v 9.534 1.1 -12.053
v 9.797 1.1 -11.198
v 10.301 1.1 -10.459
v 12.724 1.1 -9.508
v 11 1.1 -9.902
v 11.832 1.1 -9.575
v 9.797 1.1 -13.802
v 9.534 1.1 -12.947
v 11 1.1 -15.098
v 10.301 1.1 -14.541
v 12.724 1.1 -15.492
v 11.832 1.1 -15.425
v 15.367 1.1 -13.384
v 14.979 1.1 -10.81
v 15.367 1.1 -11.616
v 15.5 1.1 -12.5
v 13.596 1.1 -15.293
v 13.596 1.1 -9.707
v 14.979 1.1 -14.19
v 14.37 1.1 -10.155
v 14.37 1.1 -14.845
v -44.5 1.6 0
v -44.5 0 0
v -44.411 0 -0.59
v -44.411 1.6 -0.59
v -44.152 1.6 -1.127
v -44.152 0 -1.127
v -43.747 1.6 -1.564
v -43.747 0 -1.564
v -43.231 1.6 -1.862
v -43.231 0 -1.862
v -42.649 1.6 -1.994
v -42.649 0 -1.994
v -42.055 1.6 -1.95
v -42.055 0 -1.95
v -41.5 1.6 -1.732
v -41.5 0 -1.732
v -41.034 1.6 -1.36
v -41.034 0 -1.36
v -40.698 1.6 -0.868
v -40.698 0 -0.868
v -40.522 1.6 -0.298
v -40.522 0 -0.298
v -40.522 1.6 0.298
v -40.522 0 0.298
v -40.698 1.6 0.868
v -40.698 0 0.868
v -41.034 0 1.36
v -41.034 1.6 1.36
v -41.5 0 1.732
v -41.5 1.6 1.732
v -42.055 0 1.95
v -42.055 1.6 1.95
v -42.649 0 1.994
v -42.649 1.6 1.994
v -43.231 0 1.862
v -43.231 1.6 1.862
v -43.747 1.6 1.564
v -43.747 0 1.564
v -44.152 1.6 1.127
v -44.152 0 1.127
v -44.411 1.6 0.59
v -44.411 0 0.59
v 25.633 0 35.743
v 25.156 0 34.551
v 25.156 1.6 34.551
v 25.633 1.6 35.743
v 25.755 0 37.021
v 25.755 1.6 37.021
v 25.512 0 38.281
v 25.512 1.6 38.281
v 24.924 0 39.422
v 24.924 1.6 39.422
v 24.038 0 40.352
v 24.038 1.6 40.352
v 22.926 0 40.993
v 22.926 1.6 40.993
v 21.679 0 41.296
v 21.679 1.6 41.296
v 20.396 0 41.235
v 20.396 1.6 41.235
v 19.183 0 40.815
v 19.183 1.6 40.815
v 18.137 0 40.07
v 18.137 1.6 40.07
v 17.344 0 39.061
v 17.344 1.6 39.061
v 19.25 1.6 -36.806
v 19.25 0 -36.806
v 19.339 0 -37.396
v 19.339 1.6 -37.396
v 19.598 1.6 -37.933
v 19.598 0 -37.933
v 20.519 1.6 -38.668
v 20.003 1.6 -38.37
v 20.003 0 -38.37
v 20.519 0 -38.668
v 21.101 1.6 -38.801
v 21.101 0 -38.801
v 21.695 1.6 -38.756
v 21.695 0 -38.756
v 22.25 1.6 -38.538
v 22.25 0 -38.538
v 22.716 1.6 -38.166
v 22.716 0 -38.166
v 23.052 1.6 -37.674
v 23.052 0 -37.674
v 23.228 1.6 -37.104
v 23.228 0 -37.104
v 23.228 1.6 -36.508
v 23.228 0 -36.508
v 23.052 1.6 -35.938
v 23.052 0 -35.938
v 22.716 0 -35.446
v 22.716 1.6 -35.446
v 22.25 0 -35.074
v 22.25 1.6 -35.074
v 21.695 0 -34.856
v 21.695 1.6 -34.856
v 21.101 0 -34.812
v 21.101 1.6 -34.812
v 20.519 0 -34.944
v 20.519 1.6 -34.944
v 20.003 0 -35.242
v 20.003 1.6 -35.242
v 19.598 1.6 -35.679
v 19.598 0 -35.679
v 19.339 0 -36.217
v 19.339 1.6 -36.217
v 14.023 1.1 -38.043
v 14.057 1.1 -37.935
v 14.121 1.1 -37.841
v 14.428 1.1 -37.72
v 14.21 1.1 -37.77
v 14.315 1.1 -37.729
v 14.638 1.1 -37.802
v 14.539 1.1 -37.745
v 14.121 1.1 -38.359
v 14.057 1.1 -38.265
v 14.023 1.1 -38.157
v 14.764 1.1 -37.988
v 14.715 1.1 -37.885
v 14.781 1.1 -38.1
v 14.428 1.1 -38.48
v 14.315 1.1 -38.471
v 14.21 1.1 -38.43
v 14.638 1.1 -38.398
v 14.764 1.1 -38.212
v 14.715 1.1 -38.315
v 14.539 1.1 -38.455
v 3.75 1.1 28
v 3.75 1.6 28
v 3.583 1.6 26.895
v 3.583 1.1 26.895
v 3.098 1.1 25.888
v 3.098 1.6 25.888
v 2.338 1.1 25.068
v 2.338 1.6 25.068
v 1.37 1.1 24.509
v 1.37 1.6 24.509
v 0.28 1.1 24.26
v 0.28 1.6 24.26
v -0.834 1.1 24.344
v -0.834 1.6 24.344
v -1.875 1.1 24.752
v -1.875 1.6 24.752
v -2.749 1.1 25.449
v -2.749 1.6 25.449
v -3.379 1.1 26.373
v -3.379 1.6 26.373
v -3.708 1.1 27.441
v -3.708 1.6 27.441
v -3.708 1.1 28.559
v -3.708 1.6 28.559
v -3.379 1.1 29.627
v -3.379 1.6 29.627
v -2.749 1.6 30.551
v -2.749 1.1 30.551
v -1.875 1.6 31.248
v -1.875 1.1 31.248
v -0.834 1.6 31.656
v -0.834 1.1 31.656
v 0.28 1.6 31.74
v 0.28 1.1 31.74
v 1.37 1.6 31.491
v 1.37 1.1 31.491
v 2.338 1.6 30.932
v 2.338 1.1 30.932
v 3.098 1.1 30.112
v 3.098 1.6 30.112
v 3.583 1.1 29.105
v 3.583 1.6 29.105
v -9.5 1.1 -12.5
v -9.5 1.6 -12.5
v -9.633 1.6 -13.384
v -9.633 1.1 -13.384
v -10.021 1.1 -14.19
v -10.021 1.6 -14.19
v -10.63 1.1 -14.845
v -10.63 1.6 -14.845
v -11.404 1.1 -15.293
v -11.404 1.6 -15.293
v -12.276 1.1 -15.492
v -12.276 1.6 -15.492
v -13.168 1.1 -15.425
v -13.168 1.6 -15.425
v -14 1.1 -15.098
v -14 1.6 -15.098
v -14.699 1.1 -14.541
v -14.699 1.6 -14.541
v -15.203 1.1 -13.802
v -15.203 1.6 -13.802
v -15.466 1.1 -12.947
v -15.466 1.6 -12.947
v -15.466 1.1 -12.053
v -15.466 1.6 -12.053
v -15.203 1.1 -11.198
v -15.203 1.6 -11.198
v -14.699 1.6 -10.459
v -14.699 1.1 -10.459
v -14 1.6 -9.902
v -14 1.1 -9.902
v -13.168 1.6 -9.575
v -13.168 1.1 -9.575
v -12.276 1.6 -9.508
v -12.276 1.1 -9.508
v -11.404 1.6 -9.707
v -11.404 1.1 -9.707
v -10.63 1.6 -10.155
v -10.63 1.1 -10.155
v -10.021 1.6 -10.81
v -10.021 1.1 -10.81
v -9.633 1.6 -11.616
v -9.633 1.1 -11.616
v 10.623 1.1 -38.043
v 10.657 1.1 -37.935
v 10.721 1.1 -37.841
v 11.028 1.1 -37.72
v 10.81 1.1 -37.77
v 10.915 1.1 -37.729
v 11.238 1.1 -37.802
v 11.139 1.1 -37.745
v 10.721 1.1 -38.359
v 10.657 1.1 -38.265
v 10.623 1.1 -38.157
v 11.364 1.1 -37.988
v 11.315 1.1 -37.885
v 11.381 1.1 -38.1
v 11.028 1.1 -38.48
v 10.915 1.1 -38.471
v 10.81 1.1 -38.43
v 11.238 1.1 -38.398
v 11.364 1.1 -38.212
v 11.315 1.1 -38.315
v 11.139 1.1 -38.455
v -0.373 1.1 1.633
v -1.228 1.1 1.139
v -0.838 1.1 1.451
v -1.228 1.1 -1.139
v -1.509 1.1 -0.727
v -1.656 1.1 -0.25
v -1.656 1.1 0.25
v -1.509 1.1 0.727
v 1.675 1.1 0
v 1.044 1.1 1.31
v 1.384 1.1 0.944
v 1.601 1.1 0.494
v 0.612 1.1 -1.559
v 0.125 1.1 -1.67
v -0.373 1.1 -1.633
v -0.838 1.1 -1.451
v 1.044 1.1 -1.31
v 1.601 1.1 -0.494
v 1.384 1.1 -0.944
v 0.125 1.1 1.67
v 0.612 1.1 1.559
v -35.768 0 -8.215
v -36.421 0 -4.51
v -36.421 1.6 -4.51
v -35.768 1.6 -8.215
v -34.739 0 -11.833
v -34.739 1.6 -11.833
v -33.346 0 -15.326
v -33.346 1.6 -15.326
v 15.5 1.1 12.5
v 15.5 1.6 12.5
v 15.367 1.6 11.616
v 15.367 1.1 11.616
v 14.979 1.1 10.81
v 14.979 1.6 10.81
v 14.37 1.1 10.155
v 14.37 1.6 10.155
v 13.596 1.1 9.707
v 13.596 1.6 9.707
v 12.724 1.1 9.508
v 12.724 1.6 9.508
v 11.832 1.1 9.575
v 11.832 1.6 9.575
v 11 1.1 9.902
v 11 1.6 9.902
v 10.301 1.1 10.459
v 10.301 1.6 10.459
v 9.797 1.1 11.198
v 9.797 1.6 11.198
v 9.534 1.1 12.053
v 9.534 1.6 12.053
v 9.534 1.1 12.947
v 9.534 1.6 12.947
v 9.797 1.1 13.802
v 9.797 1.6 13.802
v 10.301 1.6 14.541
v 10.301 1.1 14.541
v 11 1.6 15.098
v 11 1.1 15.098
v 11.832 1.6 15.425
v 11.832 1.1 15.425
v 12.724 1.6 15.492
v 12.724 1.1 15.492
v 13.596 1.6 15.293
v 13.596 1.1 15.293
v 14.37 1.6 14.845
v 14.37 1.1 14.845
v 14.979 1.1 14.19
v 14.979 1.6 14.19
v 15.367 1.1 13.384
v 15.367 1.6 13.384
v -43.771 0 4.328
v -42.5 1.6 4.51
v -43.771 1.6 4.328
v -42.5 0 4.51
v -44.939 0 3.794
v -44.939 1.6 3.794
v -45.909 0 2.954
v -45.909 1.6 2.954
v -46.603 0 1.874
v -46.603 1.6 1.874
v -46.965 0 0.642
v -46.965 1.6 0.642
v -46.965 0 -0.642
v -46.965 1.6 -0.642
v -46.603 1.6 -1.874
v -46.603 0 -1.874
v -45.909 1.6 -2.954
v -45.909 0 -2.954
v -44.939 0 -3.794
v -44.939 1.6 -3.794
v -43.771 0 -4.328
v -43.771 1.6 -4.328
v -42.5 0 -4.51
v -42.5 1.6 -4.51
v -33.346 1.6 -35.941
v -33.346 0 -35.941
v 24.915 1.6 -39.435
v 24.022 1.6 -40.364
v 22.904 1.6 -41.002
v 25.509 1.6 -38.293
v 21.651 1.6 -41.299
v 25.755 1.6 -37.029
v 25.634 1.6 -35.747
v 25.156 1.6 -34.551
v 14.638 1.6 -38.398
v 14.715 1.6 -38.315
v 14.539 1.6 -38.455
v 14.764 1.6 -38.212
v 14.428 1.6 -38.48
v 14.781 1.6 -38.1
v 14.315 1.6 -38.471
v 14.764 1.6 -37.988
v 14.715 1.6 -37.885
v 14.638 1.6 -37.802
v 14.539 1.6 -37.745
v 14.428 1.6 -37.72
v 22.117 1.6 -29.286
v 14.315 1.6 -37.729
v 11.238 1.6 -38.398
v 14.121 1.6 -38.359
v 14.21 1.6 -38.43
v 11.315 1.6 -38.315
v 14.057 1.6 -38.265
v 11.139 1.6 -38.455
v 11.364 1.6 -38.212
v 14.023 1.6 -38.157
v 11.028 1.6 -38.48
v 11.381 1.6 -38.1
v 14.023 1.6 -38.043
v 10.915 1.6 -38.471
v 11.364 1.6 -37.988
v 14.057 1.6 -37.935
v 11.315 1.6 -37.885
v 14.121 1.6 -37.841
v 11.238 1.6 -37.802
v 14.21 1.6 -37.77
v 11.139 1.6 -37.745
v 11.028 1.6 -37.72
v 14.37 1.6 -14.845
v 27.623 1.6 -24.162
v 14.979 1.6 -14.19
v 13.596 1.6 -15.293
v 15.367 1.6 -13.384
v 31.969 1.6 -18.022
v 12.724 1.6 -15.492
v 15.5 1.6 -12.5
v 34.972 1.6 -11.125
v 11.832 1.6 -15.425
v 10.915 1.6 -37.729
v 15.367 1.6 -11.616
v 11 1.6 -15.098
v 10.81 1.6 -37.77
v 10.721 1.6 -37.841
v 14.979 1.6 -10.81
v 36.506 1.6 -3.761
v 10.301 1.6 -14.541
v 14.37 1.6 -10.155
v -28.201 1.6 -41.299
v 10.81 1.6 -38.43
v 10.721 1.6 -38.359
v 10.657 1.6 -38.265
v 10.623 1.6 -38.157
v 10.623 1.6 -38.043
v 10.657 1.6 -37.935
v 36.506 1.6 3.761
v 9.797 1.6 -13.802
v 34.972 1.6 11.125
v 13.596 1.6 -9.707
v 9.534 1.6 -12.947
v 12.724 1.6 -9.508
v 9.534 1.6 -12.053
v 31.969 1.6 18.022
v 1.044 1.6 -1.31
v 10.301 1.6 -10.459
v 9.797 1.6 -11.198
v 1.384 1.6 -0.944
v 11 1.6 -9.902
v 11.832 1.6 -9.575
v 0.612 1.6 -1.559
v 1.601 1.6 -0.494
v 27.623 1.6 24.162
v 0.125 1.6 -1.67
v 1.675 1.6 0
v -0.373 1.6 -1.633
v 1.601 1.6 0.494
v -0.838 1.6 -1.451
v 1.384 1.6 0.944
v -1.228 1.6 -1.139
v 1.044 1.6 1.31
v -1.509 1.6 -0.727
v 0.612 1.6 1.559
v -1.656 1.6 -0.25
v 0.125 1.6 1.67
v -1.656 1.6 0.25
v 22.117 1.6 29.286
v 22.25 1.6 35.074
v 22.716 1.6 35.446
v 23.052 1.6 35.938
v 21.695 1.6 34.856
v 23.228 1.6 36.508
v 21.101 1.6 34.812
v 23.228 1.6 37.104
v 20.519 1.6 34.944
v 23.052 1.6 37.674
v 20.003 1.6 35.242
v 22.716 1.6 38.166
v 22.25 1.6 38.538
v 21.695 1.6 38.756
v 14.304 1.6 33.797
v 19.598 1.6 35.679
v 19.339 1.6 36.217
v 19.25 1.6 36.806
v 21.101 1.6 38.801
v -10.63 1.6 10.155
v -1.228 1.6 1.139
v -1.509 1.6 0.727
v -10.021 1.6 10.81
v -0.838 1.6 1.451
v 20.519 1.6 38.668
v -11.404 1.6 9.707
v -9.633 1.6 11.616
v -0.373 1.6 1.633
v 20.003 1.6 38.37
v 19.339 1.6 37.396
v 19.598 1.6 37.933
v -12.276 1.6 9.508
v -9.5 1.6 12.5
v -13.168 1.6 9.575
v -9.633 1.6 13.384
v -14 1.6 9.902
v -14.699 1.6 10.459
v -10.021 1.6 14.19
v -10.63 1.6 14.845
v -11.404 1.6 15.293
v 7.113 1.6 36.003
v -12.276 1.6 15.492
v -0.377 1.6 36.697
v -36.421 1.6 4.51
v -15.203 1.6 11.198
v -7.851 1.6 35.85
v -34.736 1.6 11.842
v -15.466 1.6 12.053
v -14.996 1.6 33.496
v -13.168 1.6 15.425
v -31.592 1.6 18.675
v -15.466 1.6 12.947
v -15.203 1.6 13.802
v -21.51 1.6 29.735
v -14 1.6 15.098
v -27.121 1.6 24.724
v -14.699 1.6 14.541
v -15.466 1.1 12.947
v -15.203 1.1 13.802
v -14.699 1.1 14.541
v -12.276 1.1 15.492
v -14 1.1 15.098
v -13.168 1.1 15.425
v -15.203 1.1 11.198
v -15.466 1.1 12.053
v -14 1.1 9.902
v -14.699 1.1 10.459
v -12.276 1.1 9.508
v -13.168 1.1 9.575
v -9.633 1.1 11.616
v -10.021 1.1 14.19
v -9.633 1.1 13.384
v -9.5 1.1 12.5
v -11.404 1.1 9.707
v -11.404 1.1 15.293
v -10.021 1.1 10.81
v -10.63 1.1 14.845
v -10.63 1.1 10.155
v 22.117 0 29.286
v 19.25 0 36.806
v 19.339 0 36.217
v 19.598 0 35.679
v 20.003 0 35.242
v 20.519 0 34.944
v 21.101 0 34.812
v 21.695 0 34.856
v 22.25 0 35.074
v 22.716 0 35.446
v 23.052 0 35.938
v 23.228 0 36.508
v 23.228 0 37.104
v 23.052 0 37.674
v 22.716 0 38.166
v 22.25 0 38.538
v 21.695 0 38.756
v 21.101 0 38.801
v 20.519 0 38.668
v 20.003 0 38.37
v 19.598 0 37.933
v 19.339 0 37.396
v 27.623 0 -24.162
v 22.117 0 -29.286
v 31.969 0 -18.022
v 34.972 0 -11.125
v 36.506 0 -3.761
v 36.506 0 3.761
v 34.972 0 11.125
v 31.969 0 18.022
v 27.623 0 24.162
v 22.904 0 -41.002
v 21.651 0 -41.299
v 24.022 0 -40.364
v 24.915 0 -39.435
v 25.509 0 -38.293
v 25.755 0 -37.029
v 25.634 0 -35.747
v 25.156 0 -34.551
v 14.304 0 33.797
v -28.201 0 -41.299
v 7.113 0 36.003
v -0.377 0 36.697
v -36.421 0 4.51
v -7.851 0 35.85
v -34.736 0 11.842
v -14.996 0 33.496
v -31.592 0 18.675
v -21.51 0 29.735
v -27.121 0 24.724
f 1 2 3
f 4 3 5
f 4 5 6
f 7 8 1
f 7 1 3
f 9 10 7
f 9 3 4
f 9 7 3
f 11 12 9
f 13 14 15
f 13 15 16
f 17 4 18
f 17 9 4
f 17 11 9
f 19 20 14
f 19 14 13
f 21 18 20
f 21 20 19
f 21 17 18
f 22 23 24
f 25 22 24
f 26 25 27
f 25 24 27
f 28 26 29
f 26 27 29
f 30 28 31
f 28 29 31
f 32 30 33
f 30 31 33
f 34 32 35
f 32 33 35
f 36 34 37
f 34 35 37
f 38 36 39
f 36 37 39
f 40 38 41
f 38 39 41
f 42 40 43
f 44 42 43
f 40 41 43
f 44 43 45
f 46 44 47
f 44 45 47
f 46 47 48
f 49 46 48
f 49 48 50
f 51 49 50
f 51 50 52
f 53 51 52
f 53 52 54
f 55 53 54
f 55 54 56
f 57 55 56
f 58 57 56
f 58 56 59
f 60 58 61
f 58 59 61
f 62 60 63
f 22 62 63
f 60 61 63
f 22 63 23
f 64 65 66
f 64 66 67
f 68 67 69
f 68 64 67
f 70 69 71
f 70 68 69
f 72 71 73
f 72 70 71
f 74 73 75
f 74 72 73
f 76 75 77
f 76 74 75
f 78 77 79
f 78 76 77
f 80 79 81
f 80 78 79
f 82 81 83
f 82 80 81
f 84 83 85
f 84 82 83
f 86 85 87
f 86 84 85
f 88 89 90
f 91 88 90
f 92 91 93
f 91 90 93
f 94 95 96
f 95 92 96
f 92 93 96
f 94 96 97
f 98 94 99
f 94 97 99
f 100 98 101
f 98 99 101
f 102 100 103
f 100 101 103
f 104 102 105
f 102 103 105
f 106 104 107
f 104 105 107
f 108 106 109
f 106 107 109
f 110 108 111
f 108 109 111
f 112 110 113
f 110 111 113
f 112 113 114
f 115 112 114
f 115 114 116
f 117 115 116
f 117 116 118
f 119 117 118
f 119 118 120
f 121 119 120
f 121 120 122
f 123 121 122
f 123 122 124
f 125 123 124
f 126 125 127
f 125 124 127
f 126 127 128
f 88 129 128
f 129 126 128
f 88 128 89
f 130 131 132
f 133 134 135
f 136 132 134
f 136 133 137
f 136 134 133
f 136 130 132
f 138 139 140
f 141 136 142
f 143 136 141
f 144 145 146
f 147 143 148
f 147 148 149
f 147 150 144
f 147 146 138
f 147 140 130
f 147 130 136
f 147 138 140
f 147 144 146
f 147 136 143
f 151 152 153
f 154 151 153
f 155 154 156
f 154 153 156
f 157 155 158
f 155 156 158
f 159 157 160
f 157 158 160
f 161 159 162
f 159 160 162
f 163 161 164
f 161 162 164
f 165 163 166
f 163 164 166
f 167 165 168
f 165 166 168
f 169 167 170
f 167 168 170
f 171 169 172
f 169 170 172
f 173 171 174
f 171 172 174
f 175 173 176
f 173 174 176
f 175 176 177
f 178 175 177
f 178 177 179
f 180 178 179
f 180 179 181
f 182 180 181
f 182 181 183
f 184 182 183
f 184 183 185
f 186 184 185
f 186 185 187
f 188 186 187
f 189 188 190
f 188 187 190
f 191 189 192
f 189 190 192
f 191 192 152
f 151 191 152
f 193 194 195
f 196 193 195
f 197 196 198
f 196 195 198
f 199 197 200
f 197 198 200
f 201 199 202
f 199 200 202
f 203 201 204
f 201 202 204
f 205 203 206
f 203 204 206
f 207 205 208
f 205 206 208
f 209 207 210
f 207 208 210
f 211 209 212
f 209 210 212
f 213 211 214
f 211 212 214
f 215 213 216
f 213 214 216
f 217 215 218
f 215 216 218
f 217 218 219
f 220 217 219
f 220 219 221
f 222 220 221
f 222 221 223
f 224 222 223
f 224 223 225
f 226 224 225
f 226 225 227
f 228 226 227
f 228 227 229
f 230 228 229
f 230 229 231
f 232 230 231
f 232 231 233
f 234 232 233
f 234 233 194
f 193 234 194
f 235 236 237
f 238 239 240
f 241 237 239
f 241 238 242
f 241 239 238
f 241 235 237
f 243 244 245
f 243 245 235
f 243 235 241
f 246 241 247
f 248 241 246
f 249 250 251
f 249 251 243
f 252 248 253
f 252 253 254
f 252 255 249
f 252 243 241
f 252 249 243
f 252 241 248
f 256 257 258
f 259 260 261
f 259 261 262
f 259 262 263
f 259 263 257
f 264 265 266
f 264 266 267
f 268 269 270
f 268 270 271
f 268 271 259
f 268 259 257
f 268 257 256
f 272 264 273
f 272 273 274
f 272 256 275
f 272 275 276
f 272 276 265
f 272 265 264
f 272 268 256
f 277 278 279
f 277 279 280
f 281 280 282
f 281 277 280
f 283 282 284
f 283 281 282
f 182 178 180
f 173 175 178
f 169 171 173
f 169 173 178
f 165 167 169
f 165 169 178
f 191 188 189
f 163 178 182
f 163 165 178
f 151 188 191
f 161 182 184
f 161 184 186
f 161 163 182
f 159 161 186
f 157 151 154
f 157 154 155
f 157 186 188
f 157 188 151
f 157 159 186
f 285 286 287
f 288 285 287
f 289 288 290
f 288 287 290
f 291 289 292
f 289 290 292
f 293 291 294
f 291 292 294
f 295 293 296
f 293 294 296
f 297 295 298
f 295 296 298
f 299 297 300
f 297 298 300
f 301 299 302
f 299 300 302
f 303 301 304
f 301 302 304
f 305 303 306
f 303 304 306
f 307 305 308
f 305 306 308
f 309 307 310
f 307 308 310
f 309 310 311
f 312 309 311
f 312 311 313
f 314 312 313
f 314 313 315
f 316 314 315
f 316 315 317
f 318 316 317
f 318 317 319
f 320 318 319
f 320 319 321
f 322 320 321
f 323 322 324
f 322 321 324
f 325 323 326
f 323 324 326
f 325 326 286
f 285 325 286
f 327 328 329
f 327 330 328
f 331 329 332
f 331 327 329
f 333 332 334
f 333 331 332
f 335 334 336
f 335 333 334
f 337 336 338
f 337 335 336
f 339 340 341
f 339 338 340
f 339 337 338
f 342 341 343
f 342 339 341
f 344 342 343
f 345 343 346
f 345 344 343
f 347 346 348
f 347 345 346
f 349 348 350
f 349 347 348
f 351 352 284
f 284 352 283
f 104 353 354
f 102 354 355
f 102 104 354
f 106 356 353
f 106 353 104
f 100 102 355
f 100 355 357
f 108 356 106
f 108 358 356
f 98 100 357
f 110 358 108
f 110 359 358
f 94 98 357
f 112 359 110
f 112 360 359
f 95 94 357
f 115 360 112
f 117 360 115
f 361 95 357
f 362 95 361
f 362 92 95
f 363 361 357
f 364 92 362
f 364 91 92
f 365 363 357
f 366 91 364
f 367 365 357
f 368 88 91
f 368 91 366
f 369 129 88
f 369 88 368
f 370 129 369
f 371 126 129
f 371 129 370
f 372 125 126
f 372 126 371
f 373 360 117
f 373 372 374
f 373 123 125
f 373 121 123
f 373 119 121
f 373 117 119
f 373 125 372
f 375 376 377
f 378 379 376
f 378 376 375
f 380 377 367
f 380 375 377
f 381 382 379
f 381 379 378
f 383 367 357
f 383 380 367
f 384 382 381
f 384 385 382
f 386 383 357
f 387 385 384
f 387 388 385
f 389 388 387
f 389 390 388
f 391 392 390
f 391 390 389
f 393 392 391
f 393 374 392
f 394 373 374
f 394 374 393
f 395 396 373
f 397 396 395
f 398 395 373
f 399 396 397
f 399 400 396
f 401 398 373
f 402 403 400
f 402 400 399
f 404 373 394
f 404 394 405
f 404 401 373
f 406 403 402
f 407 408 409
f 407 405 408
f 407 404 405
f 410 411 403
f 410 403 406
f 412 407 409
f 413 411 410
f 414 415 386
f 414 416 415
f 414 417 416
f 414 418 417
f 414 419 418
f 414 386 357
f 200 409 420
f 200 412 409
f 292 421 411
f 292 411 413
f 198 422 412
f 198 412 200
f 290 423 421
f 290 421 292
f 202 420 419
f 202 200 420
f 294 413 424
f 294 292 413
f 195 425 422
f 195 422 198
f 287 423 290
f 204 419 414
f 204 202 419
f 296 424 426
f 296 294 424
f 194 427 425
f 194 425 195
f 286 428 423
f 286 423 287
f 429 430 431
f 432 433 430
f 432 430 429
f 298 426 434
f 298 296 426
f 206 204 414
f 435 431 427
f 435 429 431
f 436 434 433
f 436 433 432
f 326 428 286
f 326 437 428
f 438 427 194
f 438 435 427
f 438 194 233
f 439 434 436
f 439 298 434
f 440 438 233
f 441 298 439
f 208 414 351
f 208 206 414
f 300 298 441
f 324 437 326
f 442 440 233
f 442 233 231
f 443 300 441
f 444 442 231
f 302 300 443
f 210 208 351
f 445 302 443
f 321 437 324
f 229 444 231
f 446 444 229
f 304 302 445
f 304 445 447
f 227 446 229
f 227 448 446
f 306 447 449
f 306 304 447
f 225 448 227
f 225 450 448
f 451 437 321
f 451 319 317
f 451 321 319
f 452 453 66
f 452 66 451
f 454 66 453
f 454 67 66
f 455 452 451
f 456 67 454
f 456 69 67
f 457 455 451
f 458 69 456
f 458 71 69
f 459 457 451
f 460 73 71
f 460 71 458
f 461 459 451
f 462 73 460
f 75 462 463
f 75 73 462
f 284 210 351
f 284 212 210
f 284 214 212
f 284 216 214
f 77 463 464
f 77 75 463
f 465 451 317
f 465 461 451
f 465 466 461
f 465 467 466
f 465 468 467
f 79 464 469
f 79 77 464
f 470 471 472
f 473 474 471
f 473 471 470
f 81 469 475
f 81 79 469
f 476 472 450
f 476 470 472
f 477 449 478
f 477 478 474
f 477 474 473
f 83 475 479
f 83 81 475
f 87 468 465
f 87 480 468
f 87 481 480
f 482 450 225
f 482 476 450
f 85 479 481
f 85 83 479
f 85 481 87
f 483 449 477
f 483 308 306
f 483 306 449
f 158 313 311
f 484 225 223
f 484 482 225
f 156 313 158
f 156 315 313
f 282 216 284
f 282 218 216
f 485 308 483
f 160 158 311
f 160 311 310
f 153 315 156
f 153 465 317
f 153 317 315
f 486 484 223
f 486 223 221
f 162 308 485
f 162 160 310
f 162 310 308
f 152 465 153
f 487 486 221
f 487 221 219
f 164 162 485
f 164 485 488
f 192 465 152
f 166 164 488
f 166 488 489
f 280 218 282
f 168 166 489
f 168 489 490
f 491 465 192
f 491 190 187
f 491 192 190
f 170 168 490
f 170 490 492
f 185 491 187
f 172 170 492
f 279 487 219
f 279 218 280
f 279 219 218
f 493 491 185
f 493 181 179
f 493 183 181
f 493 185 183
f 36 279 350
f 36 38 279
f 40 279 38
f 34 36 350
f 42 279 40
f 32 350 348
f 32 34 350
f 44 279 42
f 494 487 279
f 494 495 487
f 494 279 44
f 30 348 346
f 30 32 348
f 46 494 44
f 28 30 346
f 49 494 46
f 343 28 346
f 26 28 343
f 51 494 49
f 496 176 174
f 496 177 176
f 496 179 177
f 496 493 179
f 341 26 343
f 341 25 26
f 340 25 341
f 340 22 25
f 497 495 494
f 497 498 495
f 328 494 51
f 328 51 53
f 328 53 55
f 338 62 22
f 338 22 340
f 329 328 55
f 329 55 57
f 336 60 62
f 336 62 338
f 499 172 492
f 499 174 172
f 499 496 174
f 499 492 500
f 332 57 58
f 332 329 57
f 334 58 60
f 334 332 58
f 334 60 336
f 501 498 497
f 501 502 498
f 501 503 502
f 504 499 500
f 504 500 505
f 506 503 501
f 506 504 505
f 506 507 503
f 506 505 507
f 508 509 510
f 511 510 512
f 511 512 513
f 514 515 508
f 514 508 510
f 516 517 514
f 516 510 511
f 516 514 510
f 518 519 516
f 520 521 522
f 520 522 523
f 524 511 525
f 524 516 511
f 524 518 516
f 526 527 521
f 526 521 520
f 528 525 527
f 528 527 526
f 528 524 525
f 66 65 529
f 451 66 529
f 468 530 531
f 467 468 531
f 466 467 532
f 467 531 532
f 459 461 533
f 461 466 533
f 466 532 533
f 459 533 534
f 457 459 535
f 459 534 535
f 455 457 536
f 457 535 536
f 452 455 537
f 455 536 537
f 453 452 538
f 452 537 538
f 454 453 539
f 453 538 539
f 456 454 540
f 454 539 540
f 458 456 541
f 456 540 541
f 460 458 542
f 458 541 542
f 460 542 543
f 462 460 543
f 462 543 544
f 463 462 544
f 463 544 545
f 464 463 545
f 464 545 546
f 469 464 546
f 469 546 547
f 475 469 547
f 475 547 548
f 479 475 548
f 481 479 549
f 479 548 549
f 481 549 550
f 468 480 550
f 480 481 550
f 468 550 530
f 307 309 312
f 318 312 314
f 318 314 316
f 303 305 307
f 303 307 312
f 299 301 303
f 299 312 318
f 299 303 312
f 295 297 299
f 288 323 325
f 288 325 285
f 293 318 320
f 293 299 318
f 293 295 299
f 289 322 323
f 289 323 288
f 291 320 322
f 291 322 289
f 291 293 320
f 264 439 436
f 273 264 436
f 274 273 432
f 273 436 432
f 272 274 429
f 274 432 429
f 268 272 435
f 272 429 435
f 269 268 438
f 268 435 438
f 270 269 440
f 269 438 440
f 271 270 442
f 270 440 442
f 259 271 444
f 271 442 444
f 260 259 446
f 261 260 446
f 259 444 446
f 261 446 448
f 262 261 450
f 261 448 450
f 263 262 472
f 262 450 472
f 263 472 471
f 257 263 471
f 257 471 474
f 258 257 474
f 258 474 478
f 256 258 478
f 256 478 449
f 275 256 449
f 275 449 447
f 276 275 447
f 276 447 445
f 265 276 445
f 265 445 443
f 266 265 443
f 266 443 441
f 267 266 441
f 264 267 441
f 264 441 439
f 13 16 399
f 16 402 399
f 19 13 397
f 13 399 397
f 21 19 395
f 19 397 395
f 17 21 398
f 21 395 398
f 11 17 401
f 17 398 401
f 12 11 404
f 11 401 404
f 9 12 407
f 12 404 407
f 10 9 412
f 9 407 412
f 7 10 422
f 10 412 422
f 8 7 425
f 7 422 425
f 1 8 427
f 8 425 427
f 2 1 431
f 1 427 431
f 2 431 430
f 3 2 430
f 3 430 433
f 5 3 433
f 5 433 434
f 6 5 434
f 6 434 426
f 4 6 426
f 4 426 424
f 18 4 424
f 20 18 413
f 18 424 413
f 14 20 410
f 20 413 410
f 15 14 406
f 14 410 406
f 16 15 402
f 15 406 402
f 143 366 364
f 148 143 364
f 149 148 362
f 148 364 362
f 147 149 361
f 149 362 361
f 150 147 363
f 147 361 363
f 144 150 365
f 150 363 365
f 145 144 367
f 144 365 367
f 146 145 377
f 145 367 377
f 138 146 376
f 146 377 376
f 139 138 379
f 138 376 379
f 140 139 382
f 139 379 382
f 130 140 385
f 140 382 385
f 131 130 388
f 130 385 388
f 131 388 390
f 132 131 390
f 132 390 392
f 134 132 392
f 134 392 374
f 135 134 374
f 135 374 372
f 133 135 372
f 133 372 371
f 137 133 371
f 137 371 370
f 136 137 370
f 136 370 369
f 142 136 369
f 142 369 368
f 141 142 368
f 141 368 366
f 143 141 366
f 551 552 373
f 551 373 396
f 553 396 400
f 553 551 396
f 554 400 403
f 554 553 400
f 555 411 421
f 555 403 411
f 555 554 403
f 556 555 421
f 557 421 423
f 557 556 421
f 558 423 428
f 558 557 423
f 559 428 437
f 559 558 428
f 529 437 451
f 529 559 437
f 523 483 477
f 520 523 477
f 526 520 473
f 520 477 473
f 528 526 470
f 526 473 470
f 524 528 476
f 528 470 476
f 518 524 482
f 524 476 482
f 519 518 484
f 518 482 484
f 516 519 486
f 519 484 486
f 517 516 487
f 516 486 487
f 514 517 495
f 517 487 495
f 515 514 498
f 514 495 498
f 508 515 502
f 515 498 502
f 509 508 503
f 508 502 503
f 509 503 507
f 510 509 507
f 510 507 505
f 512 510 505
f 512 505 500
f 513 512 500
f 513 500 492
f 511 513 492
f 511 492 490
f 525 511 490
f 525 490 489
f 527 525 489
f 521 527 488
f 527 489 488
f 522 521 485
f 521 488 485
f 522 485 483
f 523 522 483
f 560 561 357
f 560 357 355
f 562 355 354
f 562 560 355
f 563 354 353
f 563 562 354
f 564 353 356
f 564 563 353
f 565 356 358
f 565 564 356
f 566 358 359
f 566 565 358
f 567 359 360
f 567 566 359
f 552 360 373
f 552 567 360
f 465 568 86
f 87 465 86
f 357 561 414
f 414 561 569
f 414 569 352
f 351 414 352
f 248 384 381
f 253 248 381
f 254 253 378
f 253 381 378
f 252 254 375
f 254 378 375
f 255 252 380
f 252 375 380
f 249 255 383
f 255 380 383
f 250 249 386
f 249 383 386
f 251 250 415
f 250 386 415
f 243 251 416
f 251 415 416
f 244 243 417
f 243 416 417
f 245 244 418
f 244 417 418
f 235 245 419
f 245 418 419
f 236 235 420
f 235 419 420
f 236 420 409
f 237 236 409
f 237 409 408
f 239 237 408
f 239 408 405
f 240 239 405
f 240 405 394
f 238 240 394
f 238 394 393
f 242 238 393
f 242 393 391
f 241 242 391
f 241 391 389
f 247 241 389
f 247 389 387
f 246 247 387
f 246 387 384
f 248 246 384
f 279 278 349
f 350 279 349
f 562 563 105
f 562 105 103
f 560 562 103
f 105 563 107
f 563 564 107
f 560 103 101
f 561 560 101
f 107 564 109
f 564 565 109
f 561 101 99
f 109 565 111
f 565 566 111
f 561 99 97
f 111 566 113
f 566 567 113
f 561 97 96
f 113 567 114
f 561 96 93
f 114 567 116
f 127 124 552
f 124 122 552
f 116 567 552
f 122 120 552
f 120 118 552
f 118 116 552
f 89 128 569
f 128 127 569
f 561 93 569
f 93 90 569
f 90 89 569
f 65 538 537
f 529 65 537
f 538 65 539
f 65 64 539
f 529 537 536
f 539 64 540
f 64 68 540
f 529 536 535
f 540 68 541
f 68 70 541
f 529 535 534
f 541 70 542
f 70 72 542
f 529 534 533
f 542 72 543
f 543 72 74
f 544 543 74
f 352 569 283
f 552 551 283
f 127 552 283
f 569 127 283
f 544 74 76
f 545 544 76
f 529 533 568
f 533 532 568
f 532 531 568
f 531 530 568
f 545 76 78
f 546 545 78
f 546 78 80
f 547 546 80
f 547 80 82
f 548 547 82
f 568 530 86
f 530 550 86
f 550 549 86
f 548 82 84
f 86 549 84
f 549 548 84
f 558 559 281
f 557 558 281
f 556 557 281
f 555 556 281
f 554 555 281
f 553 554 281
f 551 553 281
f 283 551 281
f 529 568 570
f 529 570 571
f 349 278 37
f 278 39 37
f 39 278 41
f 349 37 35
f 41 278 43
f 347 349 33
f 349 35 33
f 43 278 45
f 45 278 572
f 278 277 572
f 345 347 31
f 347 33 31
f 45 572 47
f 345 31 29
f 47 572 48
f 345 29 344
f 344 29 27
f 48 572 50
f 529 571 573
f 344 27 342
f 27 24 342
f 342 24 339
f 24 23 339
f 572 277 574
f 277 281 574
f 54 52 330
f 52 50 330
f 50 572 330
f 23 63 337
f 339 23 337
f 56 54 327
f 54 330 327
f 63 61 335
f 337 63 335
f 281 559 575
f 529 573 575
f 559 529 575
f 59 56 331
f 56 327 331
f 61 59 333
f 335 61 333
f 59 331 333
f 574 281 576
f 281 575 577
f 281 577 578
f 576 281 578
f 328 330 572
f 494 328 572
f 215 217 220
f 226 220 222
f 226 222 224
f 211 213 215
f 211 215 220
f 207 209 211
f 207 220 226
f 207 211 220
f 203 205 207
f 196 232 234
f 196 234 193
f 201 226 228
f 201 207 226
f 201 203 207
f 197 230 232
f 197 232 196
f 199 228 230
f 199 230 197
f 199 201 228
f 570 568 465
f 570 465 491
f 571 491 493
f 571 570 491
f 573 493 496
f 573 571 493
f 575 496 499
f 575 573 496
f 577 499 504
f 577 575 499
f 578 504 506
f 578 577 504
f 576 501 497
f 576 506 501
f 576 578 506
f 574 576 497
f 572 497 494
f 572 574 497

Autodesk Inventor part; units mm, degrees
ref_plane "YZ Plane" through (0, 0, 0) normal (1, 0, 0) x (0, 1, 0)
ref_plane "XZ Plane" through (0, 0, 0) normal (0, 1, 0) x (-1, 0, 0)
ref_plane "XY Plane" through (0, 0, 0) normal (0, 0, 1) x (1, 0, 0)
sketch "Sketch1" plane through (0, 0, 0) normal (0, 1, 0) x (-1, 0, 0)
  circle A0 centre (42.5, 0) radius 2
  circle A1 centre (-21.25, 36.8061) radius 2
  circle A2 centre (-21.25, -36.8061) radius 2
  line L0 (-21.25, -36.8061) -> (0, 0) construction
  arc A3 (-25.1562, -34.5508) -> (-20.8492, -41.2987) centre (-21.25, -36.8061) ccw
  line L1 (-21.25, 36.8061) -> (0, 0) construction
  arc A4 (-17.3438, 39.0613) -> (-25.1562, 34.5508) centre (-21.25, 36.8061) ccw
  line L2 (0, 0) -> (42.5, 0) construction
  arc A5 (42.5, -4.5105) -> (42.5, 4.5105) centre (42.5, 0) ccw
  line L3 (-21.6508, -41.2987) -> (28.2014, -41.2987)
  line L4 (28.2014, -41.2987) -> (33.3458, -35.9407)
  line L5 (33.3458, -35.9407) -> (33.3458, -15.3261)
  line L6 (-25.1562, -34.5508) -> (-22.1167, -29.2863)
  line L7 (36.421, -4.5105) -> (42.5, -4.5105)
  line L8 (42.5, 0) -> (36.6992, 0)
  line L9 (4.5105, 0) -> (0, 0)
  line L10 (42.5, 4.5105) -> (36.421, 4.5105)
  line L11 (-25.1562, 34.5508) -> (-22.1167, 29.2863)
  line L12 (-14.3043, 33.7968) -> (-17.3438, 39.0613)
  arc A6 (-22.1167, 29.2863) -> (-22.1167, -29.2863) centre (0, 0) ccw
  arc A7 (33.3458, -15.3261) -> (36.421, -4.5105) centre (0, 0) ccw
  arc A8 (36.421, 4.5105) -> (-14.3043, 33.7968) centre (0, 0) ccw
  point P0 (-10.625, -18.403)
  point P1 (-10.625, 18.403)
  point P2 (21.25, 0)
  dimension "d1" = 4
  dimension "d2" = 42.5
  dimension "d5" = 360
extrude "Extrusion1" add sketch "Sketch1" along normal blind 1.6 contours L6 A6 L11 A4 L12 A8 L10 A5 L7 A7 L5 L4 L3 A3
sketch "Sketch2" plane through (0, 1.6, 0) normal (0, 1, 0) x (1, 0, 0)
  line L0 (35, 0) -> (0, 0) construction
  circle A0 centre (12.5, 12.5) radius 3
  circle A1 centre (-12.5, 12.5) radius 3
  circle A2 centre (-12.5, -12.5) radius 3
  circle A3 centre (12.5, -12.5) radius 3
  line L1 (1.675, -1.675) -> (-1.675, -1.675)
  line L2 (-1.675, -1.675) -> (-1.675, 1.675)
  line L3 (-1.675, 1.675) -> (1.675, 1.675)
  line L4 (1.675, 1.675) -> (1.675, -1.675)
  line L5 (1.675, -1.675) -> (-1.675, 1.675) construction
  line L6 (-1.675, -1.675) -> (1.675, 1.675) construction
  circle A4 centre (0, 0) radius 1.675
  circle A5 centre (0, -28) radius 3.75
  line L7 (0, -28) -> (0, 0) construction
  line L8 (-42.5, -4.5105) -> (-36.421, -4.5105) projected
  arc A6 (-42.5, 4.5105) -> (-42.5, -4.5105) centre (-42.5, 0) ccw projected
  line L9 (-36.421, 4.5105) -> (-42.5, 4.5105) projected
  arc A7 (-33.3458, 15.3261) -> (-36.421, 4.5105) centre (0, 0) ccw projected
  line L10 (-33.3458, 35.9407) -> (-33.3458, 15.3261) projected
  line L11 (-28.2014, 41.2987) -> (-33.3458, 35.9407) projected
  line L12 (21.6508, 41.2987) -> (-28.2014, 41.2987) projected
  arc A8 (25.1562, 34.5508) -> (21.6508, 41.2987) centre (21.25, 36.8061) ccw projected
  line L13 (22.1167, 29.2863) -> (25.1562, 34.5508) projected
  arc A9 (22.1167, -29.2863) -> (22.1167, 29.2863) centre (0, 0) ccw projected
  line L14 (25.1562, -34.5508) -> (22.1167, -29.2863) projected
  arc A10 (17.3438, -39.0613) -> (25.1562, -34.5508) centre (21.25, -36.8061) ccw projected
  line L15 (14.3043, -33.7968) -> (17.3438, -39.0613) projected
  arc A11 (-36.421, -4.5105) -> (14.3043, -33.7968) centre (0, 0) ccw projected
  circle A12 centre (21.25, 36.8061) radius 2 projected
  circle A13 centre (21.25, -36.8061) radius 2 projected
  circle A14 centre (-42.5, 0) radius 2 projected
  circle A15 centre (11, 38.1) radius 0.381
  circle A16 centre (14.4, 38.1) radius 0.381
  line L16 (11, 38.1) -> (14.4, 38.1) construction
  dimension "d23" = 35
  dimension "d24" = 360
  dimension "d25" = 12.5
  dimension "d26" = 12.5
  dimension "d27" = 6
  dimension "d28" = 360
  dimension "d31" = 3.35
  dimension "d32" = 28
  dimension "d33" = 7.5
  dimension "d34" = 11
  dimension "d36" = 38.1
  dimension "d37" = 3.4
  dimension "d38" = 0.762
extrude "Extrusion2" cut sketch "Sketch2" against normal blind 0.5 contours A0 | A1 | A2 | A3 | A4 | A5 | A15 | A16
equation "\"d26\" = d25"
properties part number "PCB"
